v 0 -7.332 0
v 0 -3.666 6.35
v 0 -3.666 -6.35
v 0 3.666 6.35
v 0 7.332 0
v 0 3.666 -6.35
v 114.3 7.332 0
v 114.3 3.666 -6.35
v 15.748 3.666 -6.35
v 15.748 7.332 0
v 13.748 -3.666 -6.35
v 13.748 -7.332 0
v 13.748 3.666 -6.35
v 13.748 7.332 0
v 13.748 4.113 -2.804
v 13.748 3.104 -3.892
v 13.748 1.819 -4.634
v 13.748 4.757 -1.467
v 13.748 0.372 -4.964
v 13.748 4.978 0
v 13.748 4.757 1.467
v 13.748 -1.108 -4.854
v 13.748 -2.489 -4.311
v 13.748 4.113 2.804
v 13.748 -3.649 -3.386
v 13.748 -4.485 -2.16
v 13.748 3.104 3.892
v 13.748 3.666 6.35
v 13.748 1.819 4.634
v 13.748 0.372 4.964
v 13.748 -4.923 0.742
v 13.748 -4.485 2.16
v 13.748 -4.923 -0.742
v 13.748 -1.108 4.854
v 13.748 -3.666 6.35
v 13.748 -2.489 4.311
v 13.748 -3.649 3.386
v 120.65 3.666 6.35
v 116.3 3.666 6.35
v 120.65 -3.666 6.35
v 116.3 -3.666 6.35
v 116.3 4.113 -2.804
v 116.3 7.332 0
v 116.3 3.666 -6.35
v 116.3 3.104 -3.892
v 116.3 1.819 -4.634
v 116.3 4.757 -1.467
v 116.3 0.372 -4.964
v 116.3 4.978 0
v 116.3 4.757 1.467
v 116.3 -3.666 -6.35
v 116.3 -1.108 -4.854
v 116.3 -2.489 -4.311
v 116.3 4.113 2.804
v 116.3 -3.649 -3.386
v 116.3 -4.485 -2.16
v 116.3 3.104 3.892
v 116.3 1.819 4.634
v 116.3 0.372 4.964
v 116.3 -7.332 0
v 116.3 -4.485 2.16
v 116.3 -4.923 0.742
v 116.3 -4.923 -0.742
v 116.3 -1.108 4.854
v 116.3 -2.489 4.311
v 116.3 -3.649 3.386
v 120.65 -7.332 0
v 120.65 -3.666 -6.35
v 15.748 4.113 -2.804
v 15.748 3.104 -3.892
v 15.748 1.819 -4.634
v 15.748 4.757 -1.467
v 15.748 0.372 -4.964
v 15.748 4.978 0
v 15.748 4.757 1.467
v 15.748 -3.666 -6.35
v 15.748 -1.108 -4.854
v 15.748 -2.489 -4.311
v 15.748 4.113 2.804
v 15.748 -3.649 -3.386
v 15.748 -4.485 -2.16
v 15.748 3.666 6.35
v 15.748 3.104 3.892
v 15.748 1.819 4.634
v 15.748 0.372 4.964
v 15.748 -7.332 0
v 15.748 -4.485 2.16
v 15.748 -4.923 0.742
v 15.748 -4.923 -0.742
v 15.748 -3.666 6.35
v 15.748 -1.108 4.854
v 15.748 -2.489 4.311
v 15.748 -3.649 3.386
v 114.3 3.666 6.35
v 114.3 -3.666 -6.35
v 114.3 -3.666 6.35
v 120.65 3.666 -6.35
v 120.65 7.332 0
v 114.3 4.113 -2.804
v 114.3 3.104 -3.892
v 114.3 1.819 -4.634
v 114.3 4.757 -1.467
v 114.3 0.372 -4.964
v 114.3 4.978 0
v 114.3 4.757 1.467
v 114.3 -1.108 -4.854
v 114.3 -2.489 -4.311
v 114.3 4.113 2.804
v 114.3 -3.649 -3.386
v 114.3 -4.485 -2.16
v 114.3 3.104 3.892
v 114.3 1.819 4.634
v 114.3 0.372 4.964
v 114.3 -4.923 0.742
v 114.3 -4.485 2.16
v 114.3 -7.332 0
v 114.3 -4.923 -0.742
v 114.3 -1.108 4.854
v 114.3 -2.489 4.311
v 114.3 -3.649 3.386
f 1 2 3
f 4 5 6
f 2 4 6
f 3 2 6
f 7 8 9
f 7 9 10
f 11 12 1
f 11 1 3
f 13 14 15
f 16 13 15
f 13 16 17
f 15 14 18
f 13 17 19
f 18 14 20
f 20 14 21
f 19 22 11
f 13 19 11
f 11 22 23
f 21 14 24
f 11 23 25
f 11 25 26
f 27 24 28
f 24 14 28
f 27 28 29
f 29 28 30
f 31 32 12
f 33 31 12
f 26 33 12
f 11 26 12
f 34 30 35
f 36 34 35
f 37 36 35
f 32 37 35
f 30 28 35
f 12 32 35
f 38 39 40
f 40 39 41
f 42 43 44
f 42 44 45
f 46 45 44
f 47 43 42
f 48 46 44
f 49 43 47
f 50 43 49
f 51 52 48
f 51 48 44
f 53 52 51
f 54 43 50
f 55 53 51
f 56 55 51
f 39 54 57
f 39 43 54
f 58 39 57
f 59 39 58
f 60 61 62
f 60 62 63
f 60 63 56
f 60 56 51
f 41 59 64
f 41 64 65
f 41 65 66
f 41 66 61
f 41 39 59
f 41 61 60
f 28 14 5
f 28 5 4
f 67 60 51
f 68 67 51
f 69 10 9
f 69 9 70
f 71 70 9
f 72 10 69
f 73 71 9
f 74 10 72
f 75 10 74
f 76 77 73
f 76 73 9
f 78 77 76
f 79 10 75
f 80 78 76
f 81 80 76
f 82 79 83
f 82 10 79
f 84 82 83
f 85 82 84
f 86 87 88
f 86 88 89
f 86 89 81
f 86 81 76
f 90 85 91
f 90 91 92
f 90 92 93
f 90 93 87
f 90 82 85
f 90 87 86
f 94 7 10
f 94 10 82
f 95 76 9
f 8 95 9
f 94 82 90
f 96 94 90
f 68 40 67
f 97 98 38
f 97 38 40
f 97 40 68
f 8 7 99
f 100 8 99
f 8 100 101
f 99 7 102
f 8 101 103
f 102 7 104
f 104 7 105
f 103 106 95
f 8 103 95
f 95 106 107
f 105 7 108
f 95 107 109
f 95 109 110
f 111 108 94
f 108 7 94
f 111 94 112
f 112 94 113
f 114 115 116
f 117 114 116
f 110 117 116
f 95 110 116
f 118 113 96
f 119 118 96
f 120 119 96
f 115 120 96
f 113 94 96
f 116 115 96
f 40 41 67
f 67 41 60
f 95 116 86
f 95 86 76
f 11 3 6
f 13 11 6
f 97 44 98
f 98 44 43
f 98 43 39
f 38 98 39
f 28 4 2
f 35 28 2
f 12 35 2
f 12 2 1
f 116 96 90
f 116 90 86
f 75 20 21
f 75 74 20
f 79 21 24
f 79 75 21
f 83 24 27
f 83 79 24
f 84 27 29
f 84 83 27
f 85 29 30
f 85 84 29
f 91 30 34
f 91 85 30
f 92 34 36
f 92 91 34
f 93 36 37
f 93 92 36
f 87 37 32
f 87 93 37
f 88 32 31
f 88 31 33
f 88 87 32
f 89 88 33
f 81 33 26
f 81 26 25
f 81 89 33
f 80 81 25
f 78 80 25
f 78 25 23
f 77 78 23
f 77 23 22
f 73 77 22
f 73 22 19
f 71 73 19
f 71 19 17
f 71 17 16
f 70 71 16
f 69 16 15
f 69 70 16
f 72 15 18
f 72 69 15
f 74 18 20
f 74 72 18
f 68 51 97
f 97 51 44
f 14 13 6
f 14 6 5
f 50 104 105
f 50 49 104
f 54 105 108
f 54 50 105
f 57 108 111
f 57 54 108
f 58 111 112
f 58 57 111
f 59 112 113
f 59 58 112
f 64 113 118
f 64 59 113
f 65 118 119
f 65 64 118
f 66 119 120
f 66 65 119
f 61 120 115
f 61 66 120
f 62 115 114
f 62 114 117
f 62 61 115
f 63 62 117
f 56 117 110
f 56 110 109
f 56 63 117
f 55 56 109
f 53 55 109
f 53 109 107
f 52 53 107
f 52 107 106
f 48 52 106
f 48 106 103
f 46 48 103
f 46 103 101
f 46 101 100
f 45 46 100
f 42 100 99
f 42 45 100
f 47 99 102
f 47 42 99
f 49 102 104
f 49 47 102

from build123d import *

# Parameters (mm, degrees)
BOSS_EXTRUDE1_DEPTH = 120.65
SKETCH2_W           = 2
SKETCH2_H           = 2.353948419


with BuildPart() as part:
    # Sketch1 → Boss-Extrude1 (new body)
    with BuildSketch(Plane(origin=(0, 0, 0), x_dir=(0, 0, -1), z_dir=(1, 0, 0))):
        Polygon((0, 7.332348419), (-6.35, 3.666174209), (-6.35, -3.666174209), (0, -7.332348419), (6.35, -3.666174209), (6.35, 3.666174209), align=None)
    extrude(amount=BOSS_EXTRUDE1_DEPTH)

    # Sketch2 → Cut-Revolve1 (revolve, cut)
    with BuildSketch(Plane.XY):
        with Locations((115.3, 6.15537421)):
            Rectangle(SKETCH2_W, SKETCH2_H)
        with Locations((14.748, 6.15537421)):
            Rectangle(SKETCH2_W, SKETCH2_H)
    revolve(axis=Axis((0, 0, 0), (1, 0, 0)), mode=Mode.SUBTRACT)


solid = part.part
